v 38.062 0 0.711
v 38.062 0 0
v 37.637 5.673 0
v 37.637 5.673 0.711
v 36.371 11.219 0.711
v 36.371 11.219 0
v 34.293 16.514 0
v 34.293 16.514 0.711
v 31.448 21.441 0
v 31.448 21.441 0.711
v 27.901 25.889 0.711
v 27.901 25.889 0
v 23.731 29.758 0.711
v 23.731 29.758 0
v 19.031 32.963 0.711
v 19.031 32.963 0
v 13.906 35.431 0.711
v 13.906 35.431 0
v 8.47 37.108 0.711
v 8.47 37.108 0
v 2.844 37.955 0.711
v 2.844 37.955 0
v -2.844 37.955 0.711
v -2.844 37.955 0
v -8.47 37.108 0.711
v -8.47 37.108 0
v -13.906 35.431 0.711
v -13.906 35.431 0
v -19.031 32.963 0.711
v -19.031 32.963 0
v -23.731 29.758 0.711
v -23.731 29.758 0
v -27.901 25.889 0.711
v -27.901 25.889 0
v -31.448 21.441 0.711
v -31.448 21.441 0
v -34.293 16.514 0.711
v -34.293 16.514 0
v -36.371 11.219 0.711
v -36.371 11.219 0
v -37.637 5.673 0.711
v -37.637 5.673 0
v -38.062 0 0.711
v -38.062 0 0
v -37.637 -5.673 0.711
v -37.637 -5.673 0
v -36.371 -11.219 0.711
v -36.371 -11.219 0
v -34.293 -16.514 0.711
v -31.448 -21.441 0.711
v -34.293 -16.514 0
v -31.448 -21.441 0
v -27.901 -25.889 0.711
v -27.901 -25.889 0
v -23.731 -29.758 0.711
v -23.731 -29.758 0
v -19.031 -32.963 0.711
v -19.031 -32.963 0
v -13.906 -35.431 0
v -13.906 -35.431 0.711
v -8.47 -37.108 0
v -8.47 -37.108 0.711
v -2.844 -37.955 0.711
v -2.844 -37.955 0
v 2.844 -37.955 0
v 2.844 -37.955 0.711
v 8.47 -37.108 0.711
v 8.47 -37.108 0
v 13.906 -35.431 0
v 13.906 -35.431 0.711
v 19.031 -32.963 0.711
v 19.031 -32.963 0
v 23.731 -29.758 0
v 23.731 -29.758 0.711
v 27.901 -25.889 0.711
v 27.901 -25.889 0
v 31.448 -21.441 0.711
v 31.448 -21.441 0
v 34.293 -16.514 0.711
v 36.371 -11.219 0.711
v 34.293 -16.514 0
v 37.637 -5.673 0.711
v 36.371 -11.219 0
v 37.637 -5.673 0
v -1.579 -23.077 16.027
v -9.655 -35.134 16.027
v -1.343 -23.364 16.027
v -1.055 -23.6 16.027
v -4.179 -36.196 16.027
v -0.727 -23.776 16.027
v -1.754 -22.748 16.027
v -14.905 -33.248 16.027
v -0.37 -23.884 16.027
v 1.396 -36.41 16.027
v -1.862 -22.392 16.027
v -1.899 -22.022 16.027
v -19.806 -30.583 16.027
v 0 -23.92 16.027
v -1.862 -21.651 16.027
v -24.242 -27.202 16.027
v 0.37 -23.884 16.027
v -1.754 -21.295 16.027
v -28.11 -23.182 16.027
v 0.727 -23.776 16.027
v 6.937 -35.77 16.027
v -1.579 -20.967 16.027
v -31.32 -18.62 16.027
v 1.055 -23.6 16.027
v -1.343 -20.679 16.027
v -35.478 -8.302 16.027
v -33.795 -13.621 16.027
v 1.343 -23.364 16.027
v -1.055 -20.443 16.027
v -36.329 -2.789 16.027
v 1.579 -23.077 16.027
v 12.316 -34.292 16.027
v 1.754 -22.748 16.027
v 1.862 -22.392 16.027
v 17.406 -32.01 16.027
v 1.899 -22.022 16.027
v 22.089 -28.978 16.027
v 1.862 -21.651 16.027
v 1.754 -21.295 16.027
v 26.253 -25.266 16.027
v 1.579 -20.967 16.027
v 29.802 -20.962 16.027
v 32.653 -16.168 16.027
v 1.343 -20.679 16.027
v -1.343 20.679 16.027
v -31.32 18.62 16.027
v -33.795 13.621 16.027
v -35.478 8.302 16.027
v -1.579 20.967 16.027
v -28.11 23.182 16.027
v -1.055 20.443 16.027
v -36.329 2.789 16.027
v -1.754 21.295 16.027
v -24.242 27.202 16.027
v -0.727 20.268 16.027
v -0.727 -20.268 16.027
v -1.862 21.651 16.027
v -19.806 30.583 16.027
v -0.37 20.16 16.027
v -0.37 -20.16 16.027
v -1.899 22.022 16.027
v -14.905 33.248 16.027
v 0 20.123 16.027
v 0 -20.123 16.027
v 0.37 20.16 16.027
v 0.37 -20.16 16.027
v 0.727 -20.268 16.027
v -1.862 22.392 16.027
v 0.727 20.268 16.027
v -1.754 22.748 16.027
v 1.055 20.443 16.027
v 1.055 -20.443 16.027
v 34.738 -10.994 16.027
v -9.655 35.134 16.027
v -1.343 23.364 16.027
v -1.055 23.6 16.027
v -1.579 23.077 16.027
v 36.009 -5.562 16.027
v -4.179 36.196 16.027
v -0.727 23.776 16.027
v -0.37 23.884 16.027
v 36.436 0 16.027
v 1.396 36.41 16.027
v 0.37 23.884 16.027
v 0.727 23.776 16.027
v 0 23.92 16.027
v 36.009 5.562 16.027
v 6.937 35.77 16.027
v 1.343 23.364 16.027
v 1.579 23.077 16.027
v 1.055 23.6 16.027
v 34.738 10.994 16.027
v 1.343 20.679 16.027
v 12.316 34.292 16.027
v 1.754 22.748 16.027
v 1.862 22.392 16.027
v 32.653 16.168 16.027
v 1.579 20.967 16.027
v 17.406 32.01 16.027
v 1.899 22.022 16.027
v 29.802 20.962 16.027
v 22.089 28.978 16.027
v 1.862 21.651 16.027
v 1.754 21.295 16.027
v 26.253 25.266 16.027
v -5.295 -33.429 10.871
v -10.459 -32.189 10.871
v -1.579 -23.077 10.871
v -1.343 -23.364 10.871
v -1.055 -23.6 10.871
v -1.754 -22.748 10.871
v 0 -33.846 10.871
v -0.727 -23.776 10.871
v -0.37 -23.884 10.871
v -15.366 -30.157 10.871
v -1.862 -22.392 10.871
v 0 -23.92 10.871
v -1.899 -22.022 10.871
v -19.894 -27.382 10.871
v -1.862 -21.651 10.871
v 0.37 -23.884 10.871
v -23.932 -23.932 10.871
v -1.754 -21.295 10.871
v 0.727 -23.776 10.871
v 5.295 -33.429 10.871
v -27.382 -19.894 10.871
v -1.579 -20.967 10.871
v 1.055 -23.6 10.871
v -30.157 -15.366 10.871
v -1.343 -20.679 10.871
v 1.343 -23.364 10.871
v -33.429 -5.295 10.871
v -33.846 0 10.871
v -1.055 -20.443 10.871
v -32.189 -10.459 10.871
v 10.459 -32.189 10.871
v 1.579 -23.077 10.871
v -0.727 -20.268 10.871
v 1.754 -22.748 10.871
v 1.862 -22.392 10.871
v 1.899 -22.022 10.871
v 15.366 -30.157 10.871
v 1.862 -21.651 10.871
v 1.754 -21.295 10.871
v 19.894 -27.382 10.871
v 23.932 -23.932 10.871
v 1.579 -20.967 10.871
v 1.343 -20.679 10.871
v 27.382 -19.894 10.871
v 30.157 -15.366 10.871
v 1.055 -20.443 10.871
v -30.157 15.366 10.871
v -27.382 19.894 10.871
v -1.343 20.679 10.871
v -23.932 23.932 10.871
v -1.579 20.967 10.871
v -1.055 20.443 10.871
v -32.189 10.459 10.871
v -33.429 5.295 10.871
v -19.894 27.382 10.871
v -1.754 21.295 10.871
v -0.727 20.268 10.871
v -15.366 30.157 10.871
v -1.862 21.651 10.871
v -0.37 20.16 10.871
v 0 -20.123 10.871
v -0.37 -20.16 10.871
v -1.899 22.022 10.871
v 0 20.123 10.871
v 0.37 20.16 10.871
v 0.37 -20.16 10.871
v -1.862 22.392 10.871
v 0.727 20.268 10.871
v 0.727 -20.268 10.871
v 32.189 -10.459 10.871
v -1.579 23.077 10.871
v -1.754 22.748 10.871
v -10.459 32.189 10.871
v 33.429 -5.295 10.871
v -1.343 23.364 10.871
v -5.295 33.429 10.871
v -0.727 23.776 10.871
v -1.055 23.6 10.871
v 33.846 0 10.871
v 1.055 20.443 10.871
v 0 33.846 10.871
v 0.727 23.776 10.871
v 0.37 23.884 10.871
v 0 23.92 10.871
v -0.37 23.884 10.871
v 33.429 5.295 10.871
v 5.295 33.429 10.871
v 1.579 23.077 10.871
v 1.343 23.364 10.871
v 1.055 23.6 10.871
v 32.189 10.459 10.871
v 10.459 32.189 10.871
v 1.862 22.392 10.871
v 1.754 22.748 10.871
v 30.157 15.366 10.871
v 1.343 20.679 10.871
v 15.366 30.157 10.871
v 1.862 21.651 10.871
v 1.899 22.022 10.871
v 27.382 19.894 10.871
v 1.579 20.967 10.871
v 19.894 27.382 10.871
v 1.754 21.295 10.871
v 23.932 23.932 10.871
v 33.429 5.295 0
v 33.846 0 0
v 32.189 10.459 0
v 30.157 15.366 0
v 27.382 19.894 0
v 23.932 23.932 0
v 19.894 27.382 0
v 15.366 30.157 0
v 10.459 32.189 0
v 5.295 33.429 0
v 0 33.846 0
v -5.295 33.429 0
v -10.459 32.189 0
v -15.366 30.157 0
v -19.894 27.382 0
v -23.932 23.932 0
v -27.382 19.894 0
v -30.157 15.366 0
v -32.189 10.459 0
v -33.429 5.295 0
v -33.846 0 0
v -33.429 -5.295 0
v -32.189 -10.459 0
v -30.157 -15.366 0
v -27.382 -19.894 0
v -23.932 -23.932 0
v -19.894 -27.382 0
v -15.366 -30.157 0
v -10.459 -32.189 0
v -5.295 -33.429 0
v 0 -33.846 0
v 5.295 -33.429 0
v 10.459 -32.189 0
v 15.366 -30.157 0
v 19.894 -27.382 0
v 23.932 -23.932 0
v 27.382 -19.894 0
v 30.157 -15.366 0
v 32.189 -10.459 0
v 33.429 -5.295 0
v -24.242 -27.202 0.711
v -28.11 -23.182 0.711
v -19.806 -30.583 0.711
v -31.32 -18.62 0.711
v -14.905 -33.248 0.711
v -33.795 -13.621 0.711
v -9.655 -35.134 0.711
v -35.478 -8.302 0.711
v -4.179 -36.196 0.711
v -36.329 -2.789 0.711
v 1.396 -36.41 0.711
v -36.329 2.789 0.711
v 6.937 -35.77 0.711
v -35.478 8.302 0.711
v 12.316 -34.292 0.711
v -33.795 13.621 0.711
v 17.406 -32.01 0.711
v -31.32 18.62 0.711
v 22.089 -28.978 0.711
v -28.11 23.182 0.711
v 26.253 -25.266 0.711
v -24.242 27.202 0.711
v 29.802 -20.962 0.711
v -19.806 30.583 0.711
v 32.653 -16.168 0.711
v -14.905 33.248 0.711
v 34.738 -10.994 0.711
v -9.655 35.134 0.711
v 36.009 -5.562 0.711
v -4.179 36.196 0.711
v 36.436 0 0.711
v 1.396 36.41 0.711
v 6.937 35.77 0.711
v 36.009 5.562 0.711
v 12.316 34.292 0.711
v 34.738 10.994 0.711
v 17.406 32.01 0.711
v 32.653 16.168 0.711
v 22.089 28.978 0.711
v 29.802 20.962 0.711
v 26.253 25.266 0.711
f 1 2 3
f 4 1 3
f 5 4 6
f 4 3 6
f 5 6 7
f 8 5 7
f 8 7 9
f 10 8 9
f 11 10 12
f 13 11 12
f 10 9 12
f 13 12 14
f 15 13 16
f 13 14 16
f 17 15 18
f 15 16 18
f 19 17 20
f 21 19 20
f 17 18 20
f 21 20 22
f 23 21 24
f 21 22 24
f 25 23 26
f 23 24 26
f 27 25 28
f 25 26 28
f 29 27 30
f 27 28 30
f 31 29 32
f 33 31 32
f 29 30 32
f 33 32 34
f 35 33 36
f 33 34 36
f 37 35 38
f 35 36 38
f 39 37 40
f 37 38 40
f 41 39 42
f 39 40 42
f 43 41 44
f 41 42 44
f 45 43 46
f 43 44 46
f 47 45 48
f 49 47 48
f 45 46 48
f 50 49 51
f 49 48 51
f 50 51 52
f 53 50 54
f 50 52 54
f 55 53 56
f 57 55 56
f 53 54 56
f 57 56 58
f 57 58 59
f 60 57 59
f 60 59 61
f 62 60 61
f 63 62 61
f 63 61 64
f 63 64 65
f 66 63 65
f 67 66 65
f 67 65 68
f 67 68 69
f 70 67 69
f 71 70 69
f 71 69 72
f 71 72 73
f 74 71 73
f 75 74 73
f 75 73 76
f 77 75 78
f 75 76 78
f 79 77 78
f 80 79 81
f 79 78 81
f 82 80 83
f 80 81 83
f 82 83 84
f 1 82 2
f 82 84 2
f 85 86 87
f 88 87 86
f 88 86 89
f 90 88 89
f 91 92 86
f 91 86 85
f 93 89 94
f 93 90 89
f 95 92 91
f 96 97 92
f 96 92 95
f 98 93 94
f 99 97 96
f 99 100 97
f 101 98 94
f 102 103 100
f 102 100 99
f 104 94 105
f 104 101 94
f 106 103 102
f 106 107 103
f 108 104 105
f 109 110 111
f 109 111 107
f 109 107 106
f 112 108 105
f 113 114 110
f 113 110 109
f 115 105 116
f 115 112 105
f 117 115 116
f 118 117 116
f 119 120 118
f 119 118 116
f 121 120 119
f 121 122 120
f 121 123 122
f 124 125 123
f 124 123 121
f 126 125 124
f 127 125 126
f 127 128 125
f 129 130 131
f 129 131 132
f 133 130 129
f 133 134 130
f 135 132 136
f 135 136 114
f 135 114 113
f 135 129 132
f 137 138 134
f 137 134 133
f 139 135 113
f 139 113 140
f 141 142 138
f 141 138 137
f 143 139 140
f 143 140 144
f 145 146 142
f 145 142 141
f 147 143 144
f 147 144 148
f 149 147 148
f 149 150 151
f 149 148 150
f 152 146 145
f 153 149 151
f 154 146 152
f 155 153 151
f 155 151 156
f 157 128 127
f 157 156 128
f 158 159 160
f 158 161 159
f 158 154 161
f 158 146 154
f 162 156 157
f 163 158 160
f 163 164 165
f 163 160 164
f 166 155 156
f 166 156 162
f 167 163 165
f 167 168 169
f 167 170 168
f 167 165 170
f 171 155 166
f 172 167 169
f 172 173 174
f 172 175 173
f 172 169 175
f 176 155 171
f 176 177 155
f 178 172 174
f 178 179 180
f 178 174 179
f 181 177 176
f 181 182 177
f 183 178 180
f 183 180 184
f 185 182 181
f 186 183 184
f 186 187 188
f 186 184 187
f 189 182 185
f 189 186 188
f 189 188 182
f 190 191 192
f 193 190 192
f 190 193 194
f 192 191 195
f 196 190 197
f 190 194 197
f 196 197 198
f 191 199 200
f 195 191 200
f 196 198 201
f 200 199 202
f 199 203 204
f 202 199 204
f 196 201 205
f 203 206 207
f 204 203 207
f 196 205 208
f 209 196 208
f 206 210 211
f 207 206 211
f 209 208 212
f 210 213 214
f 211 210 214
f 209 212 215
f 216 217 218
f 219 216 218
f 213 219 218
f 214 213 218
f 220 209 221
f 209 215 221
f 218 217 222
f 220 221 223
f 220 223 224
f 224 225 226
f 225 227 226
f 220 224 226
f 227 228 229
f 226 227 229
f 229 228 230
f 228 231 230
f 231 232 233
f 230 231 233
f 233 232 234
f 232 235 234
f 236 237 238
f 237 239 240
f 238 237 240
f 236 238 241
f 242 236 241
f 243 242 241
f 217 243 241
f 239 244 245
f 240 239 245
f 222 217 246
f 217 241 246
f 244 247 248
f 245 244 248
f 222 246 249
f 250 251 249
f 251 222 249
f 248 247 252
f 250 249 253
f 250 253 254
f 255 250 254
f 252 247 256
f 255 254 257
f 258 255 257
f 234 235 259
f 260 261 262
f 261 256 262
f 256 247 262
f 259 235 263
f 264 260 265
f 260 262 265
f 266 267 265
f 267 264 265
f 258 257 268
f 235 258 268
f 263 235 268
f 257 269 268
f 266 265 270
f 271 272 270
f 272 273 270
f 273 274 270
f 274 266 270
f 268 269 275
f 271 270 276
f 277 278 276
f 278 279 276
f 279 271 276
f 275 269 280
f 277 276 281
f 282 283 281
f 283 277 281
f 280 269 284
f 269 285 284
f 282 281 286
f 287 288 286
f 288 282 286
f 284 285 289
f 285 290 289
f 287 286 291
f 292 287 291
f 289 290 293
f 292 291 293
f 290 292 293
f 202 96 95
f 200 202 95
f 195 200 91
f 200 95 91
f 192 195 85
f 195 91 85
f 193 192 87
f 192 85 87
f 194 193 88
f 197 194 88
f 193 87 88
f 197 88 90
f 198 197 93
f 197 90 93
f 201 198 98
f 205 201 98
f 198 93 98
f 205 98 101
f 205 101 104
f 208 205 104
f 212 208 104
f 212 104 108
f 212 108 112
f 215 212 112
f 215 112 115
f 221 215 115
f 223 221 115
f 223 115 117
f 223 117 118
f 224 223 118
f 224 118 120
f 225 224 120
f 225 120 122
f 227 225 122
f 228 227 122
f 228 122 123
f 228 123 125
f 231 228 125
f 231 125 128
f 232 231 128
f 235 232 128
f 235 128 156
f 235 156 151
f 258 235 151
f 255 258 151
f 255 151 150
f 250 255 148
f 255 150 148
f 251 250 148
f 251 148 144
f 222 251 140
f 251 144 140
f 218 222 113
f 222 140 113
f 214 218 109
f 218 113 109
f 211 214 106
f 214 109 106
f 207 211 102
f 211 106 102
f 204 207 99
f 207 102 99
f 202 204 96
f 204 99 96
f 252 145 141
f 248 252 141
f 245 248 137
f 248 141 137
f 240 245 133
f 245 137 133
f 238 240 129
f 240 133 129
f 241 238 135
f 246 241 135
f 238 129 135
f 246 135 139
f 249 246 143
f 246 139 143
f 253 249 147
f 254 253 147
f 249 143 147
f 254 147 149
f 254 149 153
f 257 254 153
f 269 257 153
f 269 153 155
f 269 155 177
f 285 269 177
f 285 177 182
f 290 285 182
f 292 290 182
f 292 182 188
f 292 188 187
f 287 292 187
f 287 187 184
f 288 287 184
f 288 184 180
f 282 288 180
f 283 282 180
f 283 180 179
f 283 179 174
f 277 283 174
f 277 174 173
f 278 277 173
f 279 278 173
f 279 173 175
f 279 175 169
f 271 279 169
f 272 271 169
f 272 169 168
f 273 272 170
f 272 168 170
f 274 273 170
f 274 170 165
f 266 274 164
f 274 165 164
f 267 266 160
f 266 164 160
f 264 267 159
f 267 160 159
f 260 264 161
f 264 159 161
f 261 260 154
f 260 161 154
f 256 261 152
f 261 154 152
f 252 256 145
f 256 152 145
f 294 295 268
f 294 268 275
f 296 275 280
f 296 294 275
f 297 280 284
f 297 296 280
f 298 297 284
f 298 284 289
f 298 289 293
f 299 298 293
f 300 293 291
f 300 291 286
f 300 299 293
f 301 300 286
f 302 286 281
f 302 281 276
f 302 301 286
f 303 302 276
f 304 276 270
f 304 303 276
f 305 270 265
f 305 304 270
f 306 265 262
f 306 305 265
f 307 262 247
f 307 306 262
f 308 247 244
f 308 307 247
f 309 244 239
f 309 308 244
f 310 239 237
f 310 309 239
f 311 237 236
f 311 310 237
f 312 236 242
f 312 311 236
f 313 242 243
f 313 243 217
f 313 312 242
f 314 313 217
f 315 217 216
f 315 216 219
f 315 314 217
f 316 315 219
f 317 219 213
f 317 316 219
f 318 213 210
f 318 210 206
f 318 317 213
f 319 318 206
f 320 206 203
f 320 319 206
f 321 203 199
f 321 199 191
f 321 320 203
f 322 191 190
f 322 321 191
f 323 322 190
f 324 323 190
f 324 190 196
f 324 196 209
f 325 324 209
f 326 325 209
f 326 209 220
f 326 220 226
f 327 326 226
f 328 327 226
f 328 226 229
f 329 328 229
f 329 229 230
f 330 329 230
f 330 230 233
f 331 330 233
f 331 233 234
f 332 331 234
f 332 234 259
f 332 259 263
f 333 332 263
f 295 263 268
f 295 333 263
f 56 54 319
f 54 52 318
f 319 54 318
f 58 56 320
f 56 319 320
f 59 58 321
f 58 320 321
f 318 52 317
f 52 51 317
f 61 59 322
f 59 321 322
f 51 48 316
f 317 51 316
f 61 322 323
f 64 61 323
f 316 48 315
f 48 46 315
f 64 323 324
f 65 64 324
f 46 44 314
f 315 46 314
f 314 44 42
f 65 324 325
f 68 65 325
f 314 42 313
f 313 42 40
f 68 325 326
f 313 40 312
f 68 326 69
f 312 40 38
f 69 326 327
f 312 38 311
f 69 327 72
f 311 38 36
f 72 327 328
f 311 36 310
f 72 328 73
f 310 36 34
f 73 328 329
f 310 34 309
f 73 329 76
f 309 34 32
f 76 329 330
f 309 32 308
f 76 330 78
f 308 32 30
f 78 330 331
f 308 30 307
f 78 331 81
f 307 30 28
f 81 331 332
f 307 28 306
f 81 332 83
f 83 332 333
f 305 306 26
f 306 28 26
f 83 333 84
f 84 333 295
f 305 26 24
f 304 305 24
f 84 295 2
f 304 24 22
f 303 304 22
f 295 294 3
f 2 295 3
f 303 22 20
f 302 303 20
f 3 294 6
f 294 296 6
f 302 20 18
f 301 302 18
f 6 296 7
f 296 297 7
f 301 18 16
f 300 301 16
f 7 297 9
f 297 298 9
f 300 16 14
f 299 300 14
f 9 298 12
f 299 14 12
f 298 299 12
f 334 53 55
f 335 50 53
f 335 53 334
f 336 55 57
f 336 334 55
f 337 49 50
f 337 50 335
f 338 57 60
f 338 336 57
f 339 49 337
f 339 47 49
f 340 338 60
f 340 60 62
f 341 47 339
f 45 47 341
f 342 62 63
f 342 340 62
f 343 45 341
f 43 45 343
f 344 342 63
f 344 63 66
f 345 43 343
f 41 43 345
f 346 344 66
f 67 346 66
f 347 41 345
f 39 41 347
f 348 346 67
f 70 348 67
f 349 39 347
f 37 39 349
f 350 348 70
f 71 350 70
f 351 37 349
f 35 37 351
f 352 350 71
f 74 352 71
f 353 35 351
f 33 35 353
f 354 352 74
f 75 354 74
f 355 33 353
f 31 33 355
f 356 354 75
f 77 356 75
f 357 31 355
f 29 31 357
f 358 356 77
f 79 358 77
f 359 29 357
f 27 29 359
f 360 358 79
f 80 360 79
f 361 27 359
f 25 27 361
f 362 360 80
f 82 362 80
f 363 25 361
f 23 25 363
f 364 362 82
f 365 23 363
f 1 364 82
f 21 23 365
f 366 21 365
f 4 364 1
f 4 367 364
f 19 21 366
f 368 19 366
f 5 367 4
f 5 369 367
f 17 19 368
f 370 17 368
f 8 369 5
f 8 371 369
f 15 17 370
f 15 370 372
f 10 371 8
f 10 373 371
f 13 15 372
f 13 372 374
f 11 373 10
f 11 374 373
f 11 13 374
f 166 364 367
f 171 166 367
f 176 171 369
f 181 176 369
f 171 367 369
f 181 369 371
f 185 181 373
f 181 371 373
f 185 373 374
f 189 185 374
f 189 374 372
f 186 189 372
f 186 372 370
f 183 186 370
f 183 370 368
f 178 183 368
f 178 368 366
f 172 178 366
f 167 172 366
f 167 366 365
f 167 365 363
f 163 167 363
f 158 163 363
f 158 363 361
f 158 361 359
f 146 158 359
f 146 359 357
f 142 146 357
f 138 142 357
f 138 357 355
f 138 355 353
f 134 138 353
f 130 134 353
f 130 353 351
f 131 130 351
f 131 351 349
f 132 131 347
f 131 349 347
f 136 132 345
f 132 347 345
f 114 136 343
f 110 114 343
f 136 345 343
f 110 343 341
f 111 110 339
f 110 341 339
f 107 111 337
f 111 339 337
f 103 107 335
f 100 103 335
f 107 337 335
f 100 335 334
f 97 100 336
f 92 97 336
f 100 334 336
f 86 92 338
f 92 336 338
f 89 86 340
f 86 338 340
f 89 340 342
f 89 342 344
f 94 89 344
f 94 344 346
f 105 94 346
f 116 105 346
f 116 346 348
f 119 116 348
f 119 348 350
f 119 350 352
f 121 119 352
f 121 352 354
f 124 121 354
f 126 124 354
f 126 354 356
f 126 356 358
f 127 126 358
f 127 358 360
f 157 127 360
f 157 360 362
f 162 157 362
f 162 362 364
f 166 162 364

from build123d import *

# Parameters (mm, degrees)
F0_R     = 38.0619
F0_R_2   = 36.4363
F1_DEPTH = 0.7112
F0_R_3   = 33.8455
F2_DEPTH = 16.0274
F3_DEPTH = 10.8712
F5_D     = 3.7973


with BuildPart() as f1:
    # F0 (on Top) → F1 (new body)
    with BuildSketch(Plane.XY):
        Circle(F0_R)
        Circle(F0_R_2, mode=Mode.SUBTRACT)
    extrude(amount=F1_DEPTH)

    # F0 (on Top) → F2 (join)
    with BuildSketch(Plane.XY):
        Circle(F0_R_2)
        Circle(F0_R_3, mode=Mode.SUBTRACT)
        Circle(F0_R_3)
    extrude(amount=F2_DEPTH)

    # F0 (on Top) → F3 (cut)
    with BuildSketch(Plane.XY):
        Circle(F0_R_3)
    extrude(amount=F3_DEPTH, mode=Mode.SUBTRACT)

    # F5 (through all)
    with Locations(Plane(origin=(0, 0, 0), x_dir=(1, 0, 0), z_dir=(0, 0, -1))):
        with Locations((0, 22.0218), (0, -22.0218)):
            Hole(F5_D / 2)


solid = f1.part
